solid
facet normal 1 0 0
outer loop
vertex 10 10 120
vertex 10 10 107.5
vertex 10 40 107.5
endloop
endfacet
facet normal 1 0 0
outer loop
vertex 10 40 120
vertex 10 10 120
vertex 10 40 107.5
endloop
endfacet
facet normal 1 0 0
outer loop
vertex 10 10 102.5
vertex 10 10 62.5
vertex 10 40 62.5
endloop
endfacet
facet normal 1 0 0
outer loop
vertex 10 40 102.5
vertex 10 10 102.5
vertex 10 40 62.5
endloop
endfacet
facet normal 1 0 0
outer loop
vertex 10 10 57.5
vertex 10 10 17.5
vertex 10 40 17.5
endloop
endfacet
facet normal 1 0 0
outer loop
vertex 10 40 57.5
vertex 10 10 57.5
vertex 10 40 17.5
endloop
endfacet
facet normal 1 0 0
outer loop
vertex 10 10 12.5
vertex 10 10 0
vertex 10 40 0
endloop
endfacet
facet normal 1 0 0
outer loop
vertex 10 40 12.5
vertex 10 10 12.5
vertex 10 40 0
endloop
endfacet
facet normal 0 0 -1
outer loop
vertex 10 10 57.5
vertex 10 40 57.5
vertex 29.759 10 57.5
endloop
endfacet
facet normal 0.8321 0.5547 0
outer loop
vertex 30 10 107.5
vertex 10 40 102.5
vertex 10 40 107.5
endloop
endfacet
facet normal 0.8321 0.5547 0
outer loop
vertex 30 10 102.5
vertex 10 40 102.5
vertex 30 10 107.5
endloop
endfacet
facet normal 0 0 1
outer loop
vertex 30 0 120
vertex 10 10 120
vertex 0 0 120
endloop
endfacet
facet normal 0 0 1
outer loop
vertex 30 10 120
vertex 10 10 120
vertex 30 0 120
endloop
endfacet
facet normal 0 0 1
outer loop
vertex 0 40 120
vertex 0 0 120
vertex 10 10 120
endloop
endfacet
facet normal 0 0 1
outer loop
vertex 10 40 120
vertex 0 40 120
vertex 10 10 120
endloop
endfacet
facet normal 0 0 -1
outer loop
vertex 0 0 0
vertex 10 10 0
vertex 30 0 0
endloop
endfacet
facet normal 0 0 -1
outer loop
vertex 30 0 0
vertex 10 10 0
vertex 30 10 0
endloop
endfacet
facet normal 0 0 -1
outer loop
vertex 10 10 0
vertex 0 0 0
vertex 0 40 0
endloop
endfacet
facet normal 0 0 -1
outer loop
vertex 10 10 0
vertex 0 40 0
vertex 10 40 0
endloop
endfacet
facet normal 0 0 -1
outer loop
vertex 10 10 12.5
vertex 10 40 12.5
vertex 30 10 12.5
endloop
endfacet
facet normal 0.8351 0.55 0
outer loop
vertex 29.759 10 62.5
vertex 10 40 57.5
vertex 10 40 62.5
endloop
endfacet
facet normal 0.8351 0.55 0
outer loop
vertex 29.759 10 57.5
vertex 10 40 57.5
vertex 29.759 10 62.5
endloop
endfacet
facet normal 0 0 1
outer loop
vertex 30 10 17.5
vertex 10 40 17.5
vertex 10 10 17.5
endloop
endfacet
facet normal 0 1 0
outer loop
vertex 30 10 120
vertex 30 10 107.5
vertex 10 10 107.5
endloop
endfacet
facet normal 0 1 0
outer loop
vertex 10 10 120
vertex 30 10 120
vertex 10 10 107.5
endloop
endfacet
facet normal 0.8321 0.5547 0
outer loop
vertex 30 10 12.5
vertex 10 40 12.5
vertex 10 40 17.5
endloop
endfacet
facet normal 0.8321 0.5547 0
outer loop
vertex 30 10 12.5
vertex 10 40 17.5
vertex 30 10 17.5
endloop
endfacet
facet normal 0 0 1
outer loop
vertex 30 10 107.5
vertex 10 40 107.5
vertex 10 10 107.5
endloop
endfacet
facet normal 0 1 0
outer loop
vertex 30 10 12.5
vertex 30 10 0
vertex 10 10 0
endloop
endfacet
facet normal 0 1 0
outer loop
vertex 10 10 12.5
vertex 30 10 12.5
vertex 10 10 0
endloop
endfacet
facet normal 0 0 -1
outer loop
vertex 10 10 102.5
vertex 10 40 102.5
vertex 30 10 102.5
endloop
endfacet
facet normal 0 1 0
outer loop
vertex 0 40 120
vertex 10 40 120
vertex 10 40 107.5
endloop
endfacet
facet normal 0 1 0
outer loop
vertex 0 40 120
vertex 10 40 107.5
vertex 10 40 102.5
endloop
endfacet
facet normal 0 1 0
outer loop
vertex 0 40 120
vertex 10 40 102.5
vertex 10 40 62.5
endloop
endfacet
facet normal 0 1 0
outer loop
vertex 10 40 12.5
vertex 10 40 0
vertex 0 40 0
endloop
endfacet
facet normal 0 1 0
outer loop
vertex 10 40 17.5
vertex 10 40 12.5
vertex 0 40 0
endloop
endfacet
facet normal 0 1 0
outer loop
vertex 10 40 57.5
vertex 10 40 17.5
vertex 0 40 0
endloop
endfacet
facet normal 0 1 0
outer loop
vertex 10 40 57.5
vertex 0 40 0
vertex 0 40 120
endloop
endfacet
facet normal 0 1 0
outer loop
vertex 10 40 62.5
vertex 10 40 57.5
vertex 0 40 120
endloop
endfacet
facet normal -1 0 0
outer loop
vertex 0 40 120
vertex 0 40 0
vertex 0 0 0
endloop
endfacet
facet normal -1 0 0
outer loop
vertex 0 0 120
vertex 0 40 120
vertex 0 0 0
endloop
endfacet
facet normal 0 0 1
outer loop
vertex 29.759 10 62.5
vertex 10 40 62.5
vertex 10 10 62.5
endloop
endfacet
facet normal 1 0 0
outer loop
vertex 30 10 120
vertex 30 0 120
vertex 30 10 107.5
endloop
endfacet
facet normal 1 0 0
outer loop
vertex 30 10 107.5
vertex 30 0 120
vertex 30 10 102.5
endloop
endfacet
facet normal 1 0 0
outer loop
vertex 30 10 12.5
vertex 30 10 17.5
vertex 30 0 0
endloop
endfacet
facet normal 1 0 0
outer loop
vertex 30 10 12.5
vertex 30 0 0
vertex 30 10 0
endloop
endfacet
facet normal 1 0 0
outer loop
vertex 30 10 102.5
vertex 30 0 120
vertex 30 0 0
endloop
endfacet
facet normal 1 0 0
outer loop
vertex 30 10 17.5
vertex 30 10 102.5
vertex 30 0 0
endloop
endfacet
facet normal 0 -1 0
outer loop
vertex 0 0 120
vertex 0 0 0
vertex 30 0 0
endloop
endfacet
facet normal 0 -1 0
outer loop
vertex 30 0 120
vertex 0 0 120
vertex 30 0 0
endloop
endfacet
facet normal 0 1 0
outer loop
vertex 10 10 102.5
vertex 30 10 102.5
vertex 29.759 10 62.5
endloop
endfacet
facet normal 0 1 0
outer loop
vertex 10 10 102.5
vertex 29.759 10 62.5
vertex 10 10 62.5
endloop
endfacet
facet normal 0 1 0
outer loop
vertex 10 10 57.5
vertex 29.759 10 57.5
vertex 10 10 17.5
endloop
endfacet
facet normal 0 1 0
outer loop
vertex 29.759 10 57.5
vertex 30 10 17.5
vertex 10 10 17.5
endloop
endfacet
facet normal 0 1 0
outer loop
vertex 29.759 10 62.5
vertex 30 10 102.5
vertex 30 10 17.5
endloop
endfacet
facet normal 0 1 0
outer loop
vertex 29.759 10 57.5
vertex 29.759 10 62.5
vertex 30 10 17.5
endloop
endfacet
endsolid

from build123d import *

# Parameters (mm, degrees)
BOSS_EXTRUDE1_DEPTH = 120
RIB2_REACH          = 80.102
SKETCH2_WALL_W      = 194.127281078
SKETCH2_WALL_H      = 5
RIB3_REACH          = 118.297
SKETCH3_WALL_W      = 270.649579746
SKETCH3_WALL_H      = 5
RIB4_REACH          = 118.297
SKETCH4_WALL_W      = 270.649579746
SKETCH4_WALL_H      = 5


with BuildPart() as part:
    # Sketch1 → Boss-Extrude1 (new body)
    with BuildSketch(Plane.XY):
        Polygon((0, 40), (0, 0), (30, 0), (30, 10), (10, 10), (10, 40), align=None)
    extrude(amount=BOSS_EXTRUDE1_DEPTH)

    # Sketch2 wall → Rib2 (add, up to next)
    with BuildSketch(Plane(origin=(19.879407162, 25, 60), x_dir=(0.550043320359, -0.835136124071, 0), z_dir=(0.835136124071, 0.550043320359, 0)), mode=Mode.PRIVATE) as rib2_sk1:
        Rectangle(SKETCH2_WALL_W, SKETCH2_WALL_H)
    rib2_tool1 = extrude(rib2_sk1.sketch, amount=-RIB2_REACH, mode=Mode.PRIVATE) - part.part
    add(rib2_tool1.solids().sort_by_distance((19.879407162, 25, 60))[0])

    # Sketch3 wall → Rib3 (add, up to next)
    with BuildSketch(Plane(origin=(20, 25, 105), x_dir=(0.554700196225, -0.832050294338, 0), z_dir=(0.832050294338, 0.554700196225, 0)), mode=Mode.PRIVATE) as rib3_sk1:
        Rectangle(SKETCH3_WALL_W, SKETCH3_WALL_H)
    rib3_tool1 = extrude(rib3_sk1.sketch, amount=-RIB3_REACH, mode=Mode.PRIVATE) - part.part
    add(rib3_tool1.solids().sort_by_distance((20, 25, 105))[0])

    # Sketch4 wall → Rib4 (add, up to next)
    with BuildSketch(Plane(origin=(20, 25, 15), x_dir=(0.554700196225, -0.832050294338, 0), z_dir=(0.832050294338, 0.554700196225, 0)), mode=Mode.PRIVATE) as rib4_sk1:
        Rectangle(SKETCH4_WALL_W, SKETCH4_WALL_H)
    rib4_tool1 = extrude(rib4_sk1.sketch, amount=-RIB4_REACH, mode=Mode.PRIVATE) - part.part
    add(rib4_tool1.solids().sort_by_distance((20, 25, 15))[0])


solid = part.part
